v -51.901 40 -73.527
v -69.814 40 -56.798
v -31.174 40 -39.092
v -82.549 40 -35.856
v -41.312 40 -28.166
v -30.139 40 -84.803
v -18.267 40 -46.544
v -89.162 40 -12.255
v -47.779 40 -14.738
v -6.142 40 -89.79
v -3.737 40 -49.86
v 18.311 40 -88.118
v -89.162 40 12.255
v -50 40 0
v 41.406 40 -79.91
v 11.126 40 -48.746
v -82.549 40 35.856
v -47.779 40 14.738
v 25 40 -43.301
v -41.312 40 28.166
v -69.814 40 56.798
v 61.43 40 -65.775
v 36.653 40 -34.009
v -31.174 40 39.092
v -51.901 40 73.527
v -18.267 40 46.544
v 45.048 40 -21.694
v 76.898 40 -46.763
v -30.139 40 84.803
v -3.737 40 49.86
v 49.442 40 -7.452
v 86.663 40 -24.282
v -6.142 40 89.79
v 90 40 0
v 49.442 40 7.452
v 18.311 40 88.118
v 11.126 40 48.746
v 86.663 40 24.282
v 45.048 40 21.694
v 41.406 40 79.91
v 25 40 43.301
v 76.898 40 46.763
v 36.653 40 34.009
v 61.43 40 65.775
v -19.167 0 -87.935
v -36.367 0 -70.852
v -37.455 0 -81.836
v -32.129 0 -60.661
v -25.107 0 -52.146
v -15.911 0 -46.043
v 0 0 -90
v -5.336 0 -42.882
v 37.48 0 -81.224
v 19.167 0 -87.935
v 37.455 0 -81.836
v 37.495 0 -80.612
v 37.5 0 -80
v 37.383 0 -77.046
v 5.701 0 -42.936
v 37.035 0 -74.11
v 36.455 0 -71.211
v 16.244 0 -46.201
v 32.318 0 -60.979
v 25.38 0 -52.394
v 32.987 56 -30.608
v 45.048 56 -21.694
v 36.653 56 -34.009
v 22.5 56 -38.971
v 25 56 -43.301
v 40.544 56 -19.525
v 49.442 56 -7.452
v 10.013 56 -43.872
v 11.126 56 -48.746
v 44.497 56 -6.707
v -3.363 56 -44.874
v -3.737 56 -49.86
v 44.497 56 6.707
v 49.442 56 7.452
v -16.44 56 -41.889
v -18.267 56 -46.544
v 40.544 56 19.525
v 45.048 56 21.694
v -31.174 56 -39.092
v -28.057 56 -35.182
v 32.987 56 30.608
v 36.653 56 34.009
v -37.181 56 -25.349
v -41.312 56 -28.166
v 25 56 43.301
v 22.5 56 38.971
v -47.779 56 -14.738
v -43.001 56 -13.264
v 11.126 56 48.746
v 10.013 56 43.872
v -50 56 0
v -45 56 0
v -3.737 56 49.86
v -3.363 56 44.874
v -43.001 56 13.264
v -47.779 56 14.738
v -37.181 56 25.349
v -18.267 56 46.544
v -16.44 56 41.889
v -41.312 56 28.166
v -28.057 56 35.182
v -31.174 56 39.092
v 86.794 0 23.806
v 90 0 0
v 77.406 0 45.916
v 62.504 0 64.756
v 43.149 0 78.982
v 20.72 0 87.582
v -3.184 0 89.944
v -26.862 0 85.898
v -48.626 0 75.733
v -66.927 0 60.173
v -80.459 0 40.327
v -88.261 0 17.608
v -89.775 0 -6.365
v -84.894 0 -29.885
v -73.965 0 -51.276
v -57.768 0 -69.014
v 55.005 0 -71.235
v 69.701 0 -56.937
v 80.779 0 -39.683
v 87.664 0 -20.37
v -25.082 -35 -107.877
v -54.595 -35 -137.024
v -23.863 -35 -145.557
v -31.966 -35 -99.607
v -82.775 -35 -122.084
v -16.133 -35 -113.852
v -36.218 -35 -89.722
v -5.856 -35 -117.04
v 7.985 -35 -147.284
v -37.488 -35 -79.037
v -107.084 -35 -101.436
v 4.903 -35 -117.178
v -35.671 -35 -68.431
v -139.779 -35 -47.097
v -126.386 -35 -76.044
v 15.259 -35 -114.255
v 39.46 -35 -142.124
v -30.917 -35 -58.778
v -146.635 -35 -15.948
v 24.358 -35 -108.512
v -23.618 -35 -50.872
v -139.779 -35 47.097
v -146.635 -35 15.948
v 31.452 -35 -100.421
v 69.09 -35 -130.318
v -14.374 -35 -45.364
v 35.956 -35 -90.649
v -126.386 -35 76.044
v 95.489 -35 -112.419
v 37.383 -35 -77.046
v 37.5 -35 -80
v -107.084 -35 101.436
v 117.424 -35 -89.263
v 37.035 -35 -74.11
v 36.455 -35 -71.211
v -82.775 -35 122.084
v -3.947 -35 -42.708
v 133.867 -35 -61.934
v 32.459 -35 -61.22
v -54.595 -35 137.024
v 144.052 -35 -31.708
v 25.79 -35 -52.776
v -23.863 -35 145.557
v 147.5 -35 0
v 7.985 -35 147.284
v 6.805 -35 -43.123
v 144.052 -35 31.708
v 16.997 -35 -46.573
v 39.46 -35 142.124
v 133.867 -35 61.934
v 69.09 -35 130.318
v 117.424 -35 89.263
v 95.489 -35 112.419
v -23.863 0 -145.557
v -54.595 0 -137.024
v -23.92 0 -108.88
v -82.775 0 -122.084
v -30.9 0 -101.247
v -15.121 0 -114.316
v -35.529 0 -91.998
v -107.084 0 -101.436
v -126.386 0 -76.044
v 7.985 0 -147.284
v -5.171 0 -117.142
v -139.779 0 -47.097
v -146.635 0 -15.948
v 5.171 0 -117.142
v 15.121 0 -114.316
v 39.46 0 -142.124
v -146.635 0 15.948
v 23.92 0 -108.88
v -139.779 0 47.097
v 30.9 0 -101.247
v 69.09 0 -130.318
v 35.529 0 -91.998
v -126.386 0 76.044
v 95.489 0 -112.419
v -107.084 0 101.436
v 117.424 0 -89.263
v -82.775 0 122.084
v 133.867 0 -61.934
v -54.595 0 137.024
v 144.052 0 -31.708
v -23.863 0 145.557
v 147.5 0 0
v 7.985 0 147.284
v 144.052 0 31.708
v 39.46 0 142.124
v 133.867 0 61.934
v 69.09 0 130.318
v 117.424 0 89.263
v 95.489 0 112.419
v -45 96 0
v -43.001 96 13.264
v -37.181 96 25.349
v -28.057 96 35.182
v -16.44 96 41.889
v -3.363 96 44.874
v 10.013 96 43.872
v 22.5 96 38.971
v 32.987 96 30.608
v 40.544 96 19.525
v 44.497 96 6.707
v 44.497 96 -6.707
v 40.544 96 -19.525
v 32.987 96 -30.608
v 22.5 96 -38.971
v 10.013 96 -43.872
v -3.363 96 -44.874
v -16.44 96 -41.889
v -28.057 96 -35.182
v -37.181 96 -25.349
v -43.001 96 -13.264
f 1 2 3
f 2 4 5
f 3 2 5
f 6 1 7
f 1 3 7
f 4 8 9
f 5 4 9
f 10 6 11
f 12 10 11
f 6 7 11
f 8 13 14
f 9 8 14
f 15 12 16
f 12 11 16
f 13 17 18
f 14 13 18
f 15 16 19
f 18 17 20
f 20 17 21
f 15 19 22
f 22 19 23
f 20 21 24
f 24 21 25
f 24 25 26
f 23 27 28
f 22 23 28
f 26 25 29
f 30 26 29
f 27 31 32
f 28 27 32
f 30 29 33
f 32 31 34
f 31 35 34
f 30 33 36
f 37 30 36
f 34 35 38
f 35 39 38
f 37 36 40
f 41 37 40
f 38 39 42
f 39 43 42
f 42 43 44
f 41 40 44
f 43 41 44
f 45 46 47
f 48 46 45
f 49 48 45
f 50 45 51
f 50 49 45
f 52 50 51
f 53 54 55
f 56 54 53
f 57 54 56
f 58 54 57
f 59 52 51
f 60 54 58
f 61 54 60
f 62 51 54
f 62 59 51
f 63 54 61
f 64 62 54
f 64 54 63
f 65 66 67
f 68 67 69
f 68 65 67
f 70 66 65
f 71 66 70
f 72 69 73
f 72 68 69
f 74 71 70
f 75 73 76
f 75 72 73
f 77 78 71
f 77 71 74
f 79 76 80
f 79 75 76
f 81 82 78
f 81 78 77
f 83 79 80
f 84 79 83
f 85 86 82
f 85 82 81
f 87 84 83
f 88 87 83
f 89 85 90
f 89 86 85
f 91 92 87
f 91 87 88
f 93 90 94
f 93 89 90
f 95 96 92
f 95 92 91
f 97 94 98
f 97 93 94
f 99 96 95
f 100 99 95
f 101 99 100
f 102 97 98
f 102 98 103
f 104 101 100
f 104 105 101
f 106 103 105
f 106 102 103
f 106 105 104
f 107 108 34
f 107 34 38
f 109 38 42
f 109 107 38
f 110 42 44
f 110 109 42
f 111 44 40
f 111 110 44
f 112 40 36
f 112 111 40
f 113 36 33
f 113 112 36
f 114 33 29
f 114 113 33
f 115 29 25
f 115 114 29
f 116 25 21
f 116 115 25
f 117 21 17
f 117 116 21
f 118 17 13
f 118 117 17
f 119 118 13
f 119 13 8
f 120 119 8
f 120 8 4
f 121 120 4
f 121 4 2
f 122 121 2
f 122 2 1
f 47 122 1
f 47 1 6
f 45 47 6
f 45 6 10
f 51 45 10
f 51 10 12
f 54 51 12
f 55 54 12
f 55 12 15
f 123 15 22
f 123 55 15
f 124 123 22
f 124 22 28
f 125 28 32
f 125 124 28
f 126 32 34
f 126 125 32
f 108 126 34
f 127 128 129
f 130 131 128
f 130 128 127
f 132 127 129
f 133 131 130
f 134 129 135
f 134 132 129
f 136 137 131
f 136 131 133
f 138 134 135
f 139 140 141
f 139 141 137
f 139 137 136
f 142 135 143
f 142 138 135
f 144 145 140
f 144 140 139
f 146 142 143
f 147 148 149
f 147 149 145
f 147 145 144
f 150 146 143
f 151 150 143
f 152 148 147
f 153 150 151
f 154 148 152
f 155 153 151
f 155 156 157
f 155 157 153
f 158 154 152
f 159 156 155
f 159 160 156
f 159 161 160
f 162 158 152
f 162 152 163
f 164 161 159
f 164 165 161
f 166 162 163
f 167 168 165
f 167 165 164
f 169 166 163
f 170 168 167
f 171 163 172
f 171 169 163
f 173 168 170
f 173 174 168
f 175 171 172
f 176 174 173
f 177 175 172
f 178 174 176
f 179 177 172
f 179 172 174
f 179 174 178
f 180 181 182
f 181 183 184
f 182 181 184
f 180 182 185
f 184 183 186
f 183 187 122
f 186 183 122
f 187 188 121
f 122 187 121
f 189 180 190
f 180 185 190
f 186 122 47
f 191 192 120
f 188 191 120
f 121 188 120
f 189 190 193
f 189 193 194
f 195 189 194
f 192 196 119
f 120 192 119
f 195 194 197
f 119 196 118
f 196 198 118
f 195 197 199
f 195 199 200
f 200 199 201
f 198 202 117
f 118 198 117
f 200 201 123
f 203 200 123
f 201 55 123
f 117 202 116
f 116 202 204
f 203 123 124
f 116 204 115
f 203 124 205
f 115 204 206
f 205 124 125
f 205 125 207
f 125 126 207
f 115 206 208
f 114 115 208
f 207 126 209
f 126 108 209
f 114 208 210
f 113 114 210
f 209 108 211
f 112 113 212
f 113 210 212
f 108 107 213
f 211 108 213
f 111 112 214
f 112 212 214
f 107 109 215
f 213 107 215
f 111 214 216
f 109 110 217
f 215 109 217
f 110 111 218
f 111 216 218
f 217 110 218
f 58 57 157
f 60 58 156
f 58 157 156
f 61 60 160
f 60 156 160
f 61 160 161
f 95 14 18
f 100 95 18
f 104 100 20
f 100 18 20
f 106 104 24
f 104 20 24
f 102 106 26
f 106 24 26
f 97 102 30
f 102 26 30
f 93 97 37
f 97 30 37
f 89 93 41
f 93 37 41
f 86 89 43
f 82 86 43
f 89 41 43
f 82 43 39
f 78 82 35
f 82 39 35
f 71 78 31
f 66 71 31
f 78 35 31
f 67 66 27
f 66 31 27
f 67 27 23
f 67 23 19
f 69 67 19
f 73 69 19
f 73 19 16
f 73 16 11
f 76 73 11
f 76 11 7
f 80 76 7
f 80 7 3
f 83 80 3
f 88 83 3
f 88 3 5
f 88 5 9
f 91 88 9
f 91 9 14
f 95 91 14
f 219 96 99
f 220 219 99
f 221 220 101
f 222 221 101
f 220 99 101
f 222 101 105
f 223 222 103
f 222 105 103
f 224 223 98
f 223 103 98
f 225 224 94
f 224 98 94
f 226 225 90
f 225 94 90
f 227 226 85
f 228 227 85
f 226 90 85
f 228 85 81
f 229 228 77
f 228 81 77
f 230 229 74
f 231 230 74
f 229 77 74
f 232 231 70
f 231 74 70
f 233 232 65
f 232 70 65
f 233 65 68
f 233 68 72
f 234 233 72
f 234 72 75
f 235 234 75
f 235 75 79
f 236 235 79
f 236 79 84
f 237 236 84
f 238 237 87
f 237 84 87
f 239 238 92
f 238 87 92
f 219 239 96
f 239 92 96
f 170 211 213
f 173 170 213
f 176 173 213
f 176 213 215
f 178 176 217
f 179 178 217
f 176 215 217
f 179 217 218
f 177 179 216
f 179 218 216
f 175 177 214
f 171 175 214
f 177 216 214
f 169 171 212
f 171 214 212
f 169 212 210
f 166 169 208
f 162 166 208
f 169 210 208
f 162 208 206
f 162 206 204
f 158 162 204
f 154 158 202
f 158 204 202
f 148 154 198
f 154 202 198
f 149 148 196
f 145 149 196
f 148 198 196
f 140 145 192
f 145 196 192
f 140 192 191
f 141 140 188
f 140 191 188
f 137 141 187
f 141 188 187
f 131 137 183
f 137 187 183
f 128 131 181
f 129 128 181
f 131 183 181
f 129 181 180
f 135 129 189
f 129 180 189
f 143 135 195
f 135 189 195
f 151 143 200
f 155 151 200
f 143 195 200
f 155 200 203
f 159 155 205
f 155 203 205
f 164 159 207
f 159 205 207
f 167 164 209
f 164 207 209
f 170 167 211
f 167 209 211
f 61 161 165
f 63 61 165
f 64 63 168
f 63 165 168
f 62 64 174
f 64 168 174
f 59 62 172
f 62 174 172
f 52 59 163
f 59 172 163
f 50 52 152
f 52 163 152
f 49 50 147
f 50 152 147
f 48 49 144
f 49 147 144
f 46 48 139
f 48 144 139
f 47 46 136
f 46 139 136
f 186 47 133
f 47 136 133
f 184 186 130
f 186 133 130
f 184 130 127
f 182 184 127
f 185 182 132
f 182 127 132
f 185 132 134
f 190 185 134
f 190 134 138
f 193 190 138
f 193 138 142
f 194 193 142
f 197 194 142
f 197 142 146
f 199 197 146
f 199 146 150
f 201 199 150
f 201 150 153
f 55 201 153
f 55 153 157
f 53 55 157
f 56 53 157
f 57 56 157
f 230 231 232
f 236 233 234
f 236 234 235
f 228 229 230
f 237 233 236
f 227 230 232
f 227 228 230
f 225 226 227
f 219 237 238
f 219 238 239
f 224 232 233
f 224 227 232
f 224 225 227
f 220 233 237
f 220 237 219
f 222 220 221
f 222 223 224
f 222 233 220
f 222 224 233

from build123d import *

# Parameters (mm, degrees)
F0_R     = 147.5
F1_DEPTH = 35
F2_R     = 50
F3_DEPTH = 56
F4_R     = 45
F5_DEPTH = 40
F7_DEPTH = 40
F8_R     = 90
F9_DEPTH = 40


with BuildPart() as f1:
    # F0 (on Front) → F1 (new body)
    with BuildSketch(Plane.XZ):
        Circle(F0_R)
    extrude(amount=F1_DEPTH)

    # F2 (on face) → F3 (join)
    with BuildSketch(Plane(origin=(0, 0, 0), x_dir=(-1, 0, 0), z_dir=(0, 1, 0))):
        Circle(F2_R)
    extrude(amount=F3_DEPTH)

    # F4 (on face) → F5 (join)
    with BuildSketch(Plane(origin=(0, 56, 0), x_dir=(-1, 0, 0), z_dir=(0, 1, 0))):
        Circle(F4_R)
    extrude(amount=F5_DEPTH)

    # F6 (on face) → F7 (cut)
    with BuildSketch(Plane.XZ.offset(35)):
        with BuildLine():
            ThreePointArc((36.4554849148, -71.2109375), (0, -80), (-36.4554849148, -71.2109375))
            ThreePointArc((-36.4554849148, -71.2109375), (-4.4254556656, -117.2379556656), (37.5, -80))
            ThreePointArc((37.5, -80), (37.2379556656, -75.5745443344), (36.4554849148, -71.2109375))
        make_face()
        with BuildLine():
            ThreePointArc((36.4554849148, -71.2109375), (0, -42.5), (-36.4554849148, -71.2109375))
            ThreePointArc((-36.4554849148, -71.2109375), (0, -80), (36.4554849148, -71.2109375))
        make_face()
    extrude(amount=-F7_DEPTH, mode=Mode.SUBTRACT)

    # F8 (on Front) → F9 (join)
    with BuildSketch(Plane.XZ):
        Circle(F8_R)
    extrude(amount=-F9_DEPTH)


solid = f1.part
